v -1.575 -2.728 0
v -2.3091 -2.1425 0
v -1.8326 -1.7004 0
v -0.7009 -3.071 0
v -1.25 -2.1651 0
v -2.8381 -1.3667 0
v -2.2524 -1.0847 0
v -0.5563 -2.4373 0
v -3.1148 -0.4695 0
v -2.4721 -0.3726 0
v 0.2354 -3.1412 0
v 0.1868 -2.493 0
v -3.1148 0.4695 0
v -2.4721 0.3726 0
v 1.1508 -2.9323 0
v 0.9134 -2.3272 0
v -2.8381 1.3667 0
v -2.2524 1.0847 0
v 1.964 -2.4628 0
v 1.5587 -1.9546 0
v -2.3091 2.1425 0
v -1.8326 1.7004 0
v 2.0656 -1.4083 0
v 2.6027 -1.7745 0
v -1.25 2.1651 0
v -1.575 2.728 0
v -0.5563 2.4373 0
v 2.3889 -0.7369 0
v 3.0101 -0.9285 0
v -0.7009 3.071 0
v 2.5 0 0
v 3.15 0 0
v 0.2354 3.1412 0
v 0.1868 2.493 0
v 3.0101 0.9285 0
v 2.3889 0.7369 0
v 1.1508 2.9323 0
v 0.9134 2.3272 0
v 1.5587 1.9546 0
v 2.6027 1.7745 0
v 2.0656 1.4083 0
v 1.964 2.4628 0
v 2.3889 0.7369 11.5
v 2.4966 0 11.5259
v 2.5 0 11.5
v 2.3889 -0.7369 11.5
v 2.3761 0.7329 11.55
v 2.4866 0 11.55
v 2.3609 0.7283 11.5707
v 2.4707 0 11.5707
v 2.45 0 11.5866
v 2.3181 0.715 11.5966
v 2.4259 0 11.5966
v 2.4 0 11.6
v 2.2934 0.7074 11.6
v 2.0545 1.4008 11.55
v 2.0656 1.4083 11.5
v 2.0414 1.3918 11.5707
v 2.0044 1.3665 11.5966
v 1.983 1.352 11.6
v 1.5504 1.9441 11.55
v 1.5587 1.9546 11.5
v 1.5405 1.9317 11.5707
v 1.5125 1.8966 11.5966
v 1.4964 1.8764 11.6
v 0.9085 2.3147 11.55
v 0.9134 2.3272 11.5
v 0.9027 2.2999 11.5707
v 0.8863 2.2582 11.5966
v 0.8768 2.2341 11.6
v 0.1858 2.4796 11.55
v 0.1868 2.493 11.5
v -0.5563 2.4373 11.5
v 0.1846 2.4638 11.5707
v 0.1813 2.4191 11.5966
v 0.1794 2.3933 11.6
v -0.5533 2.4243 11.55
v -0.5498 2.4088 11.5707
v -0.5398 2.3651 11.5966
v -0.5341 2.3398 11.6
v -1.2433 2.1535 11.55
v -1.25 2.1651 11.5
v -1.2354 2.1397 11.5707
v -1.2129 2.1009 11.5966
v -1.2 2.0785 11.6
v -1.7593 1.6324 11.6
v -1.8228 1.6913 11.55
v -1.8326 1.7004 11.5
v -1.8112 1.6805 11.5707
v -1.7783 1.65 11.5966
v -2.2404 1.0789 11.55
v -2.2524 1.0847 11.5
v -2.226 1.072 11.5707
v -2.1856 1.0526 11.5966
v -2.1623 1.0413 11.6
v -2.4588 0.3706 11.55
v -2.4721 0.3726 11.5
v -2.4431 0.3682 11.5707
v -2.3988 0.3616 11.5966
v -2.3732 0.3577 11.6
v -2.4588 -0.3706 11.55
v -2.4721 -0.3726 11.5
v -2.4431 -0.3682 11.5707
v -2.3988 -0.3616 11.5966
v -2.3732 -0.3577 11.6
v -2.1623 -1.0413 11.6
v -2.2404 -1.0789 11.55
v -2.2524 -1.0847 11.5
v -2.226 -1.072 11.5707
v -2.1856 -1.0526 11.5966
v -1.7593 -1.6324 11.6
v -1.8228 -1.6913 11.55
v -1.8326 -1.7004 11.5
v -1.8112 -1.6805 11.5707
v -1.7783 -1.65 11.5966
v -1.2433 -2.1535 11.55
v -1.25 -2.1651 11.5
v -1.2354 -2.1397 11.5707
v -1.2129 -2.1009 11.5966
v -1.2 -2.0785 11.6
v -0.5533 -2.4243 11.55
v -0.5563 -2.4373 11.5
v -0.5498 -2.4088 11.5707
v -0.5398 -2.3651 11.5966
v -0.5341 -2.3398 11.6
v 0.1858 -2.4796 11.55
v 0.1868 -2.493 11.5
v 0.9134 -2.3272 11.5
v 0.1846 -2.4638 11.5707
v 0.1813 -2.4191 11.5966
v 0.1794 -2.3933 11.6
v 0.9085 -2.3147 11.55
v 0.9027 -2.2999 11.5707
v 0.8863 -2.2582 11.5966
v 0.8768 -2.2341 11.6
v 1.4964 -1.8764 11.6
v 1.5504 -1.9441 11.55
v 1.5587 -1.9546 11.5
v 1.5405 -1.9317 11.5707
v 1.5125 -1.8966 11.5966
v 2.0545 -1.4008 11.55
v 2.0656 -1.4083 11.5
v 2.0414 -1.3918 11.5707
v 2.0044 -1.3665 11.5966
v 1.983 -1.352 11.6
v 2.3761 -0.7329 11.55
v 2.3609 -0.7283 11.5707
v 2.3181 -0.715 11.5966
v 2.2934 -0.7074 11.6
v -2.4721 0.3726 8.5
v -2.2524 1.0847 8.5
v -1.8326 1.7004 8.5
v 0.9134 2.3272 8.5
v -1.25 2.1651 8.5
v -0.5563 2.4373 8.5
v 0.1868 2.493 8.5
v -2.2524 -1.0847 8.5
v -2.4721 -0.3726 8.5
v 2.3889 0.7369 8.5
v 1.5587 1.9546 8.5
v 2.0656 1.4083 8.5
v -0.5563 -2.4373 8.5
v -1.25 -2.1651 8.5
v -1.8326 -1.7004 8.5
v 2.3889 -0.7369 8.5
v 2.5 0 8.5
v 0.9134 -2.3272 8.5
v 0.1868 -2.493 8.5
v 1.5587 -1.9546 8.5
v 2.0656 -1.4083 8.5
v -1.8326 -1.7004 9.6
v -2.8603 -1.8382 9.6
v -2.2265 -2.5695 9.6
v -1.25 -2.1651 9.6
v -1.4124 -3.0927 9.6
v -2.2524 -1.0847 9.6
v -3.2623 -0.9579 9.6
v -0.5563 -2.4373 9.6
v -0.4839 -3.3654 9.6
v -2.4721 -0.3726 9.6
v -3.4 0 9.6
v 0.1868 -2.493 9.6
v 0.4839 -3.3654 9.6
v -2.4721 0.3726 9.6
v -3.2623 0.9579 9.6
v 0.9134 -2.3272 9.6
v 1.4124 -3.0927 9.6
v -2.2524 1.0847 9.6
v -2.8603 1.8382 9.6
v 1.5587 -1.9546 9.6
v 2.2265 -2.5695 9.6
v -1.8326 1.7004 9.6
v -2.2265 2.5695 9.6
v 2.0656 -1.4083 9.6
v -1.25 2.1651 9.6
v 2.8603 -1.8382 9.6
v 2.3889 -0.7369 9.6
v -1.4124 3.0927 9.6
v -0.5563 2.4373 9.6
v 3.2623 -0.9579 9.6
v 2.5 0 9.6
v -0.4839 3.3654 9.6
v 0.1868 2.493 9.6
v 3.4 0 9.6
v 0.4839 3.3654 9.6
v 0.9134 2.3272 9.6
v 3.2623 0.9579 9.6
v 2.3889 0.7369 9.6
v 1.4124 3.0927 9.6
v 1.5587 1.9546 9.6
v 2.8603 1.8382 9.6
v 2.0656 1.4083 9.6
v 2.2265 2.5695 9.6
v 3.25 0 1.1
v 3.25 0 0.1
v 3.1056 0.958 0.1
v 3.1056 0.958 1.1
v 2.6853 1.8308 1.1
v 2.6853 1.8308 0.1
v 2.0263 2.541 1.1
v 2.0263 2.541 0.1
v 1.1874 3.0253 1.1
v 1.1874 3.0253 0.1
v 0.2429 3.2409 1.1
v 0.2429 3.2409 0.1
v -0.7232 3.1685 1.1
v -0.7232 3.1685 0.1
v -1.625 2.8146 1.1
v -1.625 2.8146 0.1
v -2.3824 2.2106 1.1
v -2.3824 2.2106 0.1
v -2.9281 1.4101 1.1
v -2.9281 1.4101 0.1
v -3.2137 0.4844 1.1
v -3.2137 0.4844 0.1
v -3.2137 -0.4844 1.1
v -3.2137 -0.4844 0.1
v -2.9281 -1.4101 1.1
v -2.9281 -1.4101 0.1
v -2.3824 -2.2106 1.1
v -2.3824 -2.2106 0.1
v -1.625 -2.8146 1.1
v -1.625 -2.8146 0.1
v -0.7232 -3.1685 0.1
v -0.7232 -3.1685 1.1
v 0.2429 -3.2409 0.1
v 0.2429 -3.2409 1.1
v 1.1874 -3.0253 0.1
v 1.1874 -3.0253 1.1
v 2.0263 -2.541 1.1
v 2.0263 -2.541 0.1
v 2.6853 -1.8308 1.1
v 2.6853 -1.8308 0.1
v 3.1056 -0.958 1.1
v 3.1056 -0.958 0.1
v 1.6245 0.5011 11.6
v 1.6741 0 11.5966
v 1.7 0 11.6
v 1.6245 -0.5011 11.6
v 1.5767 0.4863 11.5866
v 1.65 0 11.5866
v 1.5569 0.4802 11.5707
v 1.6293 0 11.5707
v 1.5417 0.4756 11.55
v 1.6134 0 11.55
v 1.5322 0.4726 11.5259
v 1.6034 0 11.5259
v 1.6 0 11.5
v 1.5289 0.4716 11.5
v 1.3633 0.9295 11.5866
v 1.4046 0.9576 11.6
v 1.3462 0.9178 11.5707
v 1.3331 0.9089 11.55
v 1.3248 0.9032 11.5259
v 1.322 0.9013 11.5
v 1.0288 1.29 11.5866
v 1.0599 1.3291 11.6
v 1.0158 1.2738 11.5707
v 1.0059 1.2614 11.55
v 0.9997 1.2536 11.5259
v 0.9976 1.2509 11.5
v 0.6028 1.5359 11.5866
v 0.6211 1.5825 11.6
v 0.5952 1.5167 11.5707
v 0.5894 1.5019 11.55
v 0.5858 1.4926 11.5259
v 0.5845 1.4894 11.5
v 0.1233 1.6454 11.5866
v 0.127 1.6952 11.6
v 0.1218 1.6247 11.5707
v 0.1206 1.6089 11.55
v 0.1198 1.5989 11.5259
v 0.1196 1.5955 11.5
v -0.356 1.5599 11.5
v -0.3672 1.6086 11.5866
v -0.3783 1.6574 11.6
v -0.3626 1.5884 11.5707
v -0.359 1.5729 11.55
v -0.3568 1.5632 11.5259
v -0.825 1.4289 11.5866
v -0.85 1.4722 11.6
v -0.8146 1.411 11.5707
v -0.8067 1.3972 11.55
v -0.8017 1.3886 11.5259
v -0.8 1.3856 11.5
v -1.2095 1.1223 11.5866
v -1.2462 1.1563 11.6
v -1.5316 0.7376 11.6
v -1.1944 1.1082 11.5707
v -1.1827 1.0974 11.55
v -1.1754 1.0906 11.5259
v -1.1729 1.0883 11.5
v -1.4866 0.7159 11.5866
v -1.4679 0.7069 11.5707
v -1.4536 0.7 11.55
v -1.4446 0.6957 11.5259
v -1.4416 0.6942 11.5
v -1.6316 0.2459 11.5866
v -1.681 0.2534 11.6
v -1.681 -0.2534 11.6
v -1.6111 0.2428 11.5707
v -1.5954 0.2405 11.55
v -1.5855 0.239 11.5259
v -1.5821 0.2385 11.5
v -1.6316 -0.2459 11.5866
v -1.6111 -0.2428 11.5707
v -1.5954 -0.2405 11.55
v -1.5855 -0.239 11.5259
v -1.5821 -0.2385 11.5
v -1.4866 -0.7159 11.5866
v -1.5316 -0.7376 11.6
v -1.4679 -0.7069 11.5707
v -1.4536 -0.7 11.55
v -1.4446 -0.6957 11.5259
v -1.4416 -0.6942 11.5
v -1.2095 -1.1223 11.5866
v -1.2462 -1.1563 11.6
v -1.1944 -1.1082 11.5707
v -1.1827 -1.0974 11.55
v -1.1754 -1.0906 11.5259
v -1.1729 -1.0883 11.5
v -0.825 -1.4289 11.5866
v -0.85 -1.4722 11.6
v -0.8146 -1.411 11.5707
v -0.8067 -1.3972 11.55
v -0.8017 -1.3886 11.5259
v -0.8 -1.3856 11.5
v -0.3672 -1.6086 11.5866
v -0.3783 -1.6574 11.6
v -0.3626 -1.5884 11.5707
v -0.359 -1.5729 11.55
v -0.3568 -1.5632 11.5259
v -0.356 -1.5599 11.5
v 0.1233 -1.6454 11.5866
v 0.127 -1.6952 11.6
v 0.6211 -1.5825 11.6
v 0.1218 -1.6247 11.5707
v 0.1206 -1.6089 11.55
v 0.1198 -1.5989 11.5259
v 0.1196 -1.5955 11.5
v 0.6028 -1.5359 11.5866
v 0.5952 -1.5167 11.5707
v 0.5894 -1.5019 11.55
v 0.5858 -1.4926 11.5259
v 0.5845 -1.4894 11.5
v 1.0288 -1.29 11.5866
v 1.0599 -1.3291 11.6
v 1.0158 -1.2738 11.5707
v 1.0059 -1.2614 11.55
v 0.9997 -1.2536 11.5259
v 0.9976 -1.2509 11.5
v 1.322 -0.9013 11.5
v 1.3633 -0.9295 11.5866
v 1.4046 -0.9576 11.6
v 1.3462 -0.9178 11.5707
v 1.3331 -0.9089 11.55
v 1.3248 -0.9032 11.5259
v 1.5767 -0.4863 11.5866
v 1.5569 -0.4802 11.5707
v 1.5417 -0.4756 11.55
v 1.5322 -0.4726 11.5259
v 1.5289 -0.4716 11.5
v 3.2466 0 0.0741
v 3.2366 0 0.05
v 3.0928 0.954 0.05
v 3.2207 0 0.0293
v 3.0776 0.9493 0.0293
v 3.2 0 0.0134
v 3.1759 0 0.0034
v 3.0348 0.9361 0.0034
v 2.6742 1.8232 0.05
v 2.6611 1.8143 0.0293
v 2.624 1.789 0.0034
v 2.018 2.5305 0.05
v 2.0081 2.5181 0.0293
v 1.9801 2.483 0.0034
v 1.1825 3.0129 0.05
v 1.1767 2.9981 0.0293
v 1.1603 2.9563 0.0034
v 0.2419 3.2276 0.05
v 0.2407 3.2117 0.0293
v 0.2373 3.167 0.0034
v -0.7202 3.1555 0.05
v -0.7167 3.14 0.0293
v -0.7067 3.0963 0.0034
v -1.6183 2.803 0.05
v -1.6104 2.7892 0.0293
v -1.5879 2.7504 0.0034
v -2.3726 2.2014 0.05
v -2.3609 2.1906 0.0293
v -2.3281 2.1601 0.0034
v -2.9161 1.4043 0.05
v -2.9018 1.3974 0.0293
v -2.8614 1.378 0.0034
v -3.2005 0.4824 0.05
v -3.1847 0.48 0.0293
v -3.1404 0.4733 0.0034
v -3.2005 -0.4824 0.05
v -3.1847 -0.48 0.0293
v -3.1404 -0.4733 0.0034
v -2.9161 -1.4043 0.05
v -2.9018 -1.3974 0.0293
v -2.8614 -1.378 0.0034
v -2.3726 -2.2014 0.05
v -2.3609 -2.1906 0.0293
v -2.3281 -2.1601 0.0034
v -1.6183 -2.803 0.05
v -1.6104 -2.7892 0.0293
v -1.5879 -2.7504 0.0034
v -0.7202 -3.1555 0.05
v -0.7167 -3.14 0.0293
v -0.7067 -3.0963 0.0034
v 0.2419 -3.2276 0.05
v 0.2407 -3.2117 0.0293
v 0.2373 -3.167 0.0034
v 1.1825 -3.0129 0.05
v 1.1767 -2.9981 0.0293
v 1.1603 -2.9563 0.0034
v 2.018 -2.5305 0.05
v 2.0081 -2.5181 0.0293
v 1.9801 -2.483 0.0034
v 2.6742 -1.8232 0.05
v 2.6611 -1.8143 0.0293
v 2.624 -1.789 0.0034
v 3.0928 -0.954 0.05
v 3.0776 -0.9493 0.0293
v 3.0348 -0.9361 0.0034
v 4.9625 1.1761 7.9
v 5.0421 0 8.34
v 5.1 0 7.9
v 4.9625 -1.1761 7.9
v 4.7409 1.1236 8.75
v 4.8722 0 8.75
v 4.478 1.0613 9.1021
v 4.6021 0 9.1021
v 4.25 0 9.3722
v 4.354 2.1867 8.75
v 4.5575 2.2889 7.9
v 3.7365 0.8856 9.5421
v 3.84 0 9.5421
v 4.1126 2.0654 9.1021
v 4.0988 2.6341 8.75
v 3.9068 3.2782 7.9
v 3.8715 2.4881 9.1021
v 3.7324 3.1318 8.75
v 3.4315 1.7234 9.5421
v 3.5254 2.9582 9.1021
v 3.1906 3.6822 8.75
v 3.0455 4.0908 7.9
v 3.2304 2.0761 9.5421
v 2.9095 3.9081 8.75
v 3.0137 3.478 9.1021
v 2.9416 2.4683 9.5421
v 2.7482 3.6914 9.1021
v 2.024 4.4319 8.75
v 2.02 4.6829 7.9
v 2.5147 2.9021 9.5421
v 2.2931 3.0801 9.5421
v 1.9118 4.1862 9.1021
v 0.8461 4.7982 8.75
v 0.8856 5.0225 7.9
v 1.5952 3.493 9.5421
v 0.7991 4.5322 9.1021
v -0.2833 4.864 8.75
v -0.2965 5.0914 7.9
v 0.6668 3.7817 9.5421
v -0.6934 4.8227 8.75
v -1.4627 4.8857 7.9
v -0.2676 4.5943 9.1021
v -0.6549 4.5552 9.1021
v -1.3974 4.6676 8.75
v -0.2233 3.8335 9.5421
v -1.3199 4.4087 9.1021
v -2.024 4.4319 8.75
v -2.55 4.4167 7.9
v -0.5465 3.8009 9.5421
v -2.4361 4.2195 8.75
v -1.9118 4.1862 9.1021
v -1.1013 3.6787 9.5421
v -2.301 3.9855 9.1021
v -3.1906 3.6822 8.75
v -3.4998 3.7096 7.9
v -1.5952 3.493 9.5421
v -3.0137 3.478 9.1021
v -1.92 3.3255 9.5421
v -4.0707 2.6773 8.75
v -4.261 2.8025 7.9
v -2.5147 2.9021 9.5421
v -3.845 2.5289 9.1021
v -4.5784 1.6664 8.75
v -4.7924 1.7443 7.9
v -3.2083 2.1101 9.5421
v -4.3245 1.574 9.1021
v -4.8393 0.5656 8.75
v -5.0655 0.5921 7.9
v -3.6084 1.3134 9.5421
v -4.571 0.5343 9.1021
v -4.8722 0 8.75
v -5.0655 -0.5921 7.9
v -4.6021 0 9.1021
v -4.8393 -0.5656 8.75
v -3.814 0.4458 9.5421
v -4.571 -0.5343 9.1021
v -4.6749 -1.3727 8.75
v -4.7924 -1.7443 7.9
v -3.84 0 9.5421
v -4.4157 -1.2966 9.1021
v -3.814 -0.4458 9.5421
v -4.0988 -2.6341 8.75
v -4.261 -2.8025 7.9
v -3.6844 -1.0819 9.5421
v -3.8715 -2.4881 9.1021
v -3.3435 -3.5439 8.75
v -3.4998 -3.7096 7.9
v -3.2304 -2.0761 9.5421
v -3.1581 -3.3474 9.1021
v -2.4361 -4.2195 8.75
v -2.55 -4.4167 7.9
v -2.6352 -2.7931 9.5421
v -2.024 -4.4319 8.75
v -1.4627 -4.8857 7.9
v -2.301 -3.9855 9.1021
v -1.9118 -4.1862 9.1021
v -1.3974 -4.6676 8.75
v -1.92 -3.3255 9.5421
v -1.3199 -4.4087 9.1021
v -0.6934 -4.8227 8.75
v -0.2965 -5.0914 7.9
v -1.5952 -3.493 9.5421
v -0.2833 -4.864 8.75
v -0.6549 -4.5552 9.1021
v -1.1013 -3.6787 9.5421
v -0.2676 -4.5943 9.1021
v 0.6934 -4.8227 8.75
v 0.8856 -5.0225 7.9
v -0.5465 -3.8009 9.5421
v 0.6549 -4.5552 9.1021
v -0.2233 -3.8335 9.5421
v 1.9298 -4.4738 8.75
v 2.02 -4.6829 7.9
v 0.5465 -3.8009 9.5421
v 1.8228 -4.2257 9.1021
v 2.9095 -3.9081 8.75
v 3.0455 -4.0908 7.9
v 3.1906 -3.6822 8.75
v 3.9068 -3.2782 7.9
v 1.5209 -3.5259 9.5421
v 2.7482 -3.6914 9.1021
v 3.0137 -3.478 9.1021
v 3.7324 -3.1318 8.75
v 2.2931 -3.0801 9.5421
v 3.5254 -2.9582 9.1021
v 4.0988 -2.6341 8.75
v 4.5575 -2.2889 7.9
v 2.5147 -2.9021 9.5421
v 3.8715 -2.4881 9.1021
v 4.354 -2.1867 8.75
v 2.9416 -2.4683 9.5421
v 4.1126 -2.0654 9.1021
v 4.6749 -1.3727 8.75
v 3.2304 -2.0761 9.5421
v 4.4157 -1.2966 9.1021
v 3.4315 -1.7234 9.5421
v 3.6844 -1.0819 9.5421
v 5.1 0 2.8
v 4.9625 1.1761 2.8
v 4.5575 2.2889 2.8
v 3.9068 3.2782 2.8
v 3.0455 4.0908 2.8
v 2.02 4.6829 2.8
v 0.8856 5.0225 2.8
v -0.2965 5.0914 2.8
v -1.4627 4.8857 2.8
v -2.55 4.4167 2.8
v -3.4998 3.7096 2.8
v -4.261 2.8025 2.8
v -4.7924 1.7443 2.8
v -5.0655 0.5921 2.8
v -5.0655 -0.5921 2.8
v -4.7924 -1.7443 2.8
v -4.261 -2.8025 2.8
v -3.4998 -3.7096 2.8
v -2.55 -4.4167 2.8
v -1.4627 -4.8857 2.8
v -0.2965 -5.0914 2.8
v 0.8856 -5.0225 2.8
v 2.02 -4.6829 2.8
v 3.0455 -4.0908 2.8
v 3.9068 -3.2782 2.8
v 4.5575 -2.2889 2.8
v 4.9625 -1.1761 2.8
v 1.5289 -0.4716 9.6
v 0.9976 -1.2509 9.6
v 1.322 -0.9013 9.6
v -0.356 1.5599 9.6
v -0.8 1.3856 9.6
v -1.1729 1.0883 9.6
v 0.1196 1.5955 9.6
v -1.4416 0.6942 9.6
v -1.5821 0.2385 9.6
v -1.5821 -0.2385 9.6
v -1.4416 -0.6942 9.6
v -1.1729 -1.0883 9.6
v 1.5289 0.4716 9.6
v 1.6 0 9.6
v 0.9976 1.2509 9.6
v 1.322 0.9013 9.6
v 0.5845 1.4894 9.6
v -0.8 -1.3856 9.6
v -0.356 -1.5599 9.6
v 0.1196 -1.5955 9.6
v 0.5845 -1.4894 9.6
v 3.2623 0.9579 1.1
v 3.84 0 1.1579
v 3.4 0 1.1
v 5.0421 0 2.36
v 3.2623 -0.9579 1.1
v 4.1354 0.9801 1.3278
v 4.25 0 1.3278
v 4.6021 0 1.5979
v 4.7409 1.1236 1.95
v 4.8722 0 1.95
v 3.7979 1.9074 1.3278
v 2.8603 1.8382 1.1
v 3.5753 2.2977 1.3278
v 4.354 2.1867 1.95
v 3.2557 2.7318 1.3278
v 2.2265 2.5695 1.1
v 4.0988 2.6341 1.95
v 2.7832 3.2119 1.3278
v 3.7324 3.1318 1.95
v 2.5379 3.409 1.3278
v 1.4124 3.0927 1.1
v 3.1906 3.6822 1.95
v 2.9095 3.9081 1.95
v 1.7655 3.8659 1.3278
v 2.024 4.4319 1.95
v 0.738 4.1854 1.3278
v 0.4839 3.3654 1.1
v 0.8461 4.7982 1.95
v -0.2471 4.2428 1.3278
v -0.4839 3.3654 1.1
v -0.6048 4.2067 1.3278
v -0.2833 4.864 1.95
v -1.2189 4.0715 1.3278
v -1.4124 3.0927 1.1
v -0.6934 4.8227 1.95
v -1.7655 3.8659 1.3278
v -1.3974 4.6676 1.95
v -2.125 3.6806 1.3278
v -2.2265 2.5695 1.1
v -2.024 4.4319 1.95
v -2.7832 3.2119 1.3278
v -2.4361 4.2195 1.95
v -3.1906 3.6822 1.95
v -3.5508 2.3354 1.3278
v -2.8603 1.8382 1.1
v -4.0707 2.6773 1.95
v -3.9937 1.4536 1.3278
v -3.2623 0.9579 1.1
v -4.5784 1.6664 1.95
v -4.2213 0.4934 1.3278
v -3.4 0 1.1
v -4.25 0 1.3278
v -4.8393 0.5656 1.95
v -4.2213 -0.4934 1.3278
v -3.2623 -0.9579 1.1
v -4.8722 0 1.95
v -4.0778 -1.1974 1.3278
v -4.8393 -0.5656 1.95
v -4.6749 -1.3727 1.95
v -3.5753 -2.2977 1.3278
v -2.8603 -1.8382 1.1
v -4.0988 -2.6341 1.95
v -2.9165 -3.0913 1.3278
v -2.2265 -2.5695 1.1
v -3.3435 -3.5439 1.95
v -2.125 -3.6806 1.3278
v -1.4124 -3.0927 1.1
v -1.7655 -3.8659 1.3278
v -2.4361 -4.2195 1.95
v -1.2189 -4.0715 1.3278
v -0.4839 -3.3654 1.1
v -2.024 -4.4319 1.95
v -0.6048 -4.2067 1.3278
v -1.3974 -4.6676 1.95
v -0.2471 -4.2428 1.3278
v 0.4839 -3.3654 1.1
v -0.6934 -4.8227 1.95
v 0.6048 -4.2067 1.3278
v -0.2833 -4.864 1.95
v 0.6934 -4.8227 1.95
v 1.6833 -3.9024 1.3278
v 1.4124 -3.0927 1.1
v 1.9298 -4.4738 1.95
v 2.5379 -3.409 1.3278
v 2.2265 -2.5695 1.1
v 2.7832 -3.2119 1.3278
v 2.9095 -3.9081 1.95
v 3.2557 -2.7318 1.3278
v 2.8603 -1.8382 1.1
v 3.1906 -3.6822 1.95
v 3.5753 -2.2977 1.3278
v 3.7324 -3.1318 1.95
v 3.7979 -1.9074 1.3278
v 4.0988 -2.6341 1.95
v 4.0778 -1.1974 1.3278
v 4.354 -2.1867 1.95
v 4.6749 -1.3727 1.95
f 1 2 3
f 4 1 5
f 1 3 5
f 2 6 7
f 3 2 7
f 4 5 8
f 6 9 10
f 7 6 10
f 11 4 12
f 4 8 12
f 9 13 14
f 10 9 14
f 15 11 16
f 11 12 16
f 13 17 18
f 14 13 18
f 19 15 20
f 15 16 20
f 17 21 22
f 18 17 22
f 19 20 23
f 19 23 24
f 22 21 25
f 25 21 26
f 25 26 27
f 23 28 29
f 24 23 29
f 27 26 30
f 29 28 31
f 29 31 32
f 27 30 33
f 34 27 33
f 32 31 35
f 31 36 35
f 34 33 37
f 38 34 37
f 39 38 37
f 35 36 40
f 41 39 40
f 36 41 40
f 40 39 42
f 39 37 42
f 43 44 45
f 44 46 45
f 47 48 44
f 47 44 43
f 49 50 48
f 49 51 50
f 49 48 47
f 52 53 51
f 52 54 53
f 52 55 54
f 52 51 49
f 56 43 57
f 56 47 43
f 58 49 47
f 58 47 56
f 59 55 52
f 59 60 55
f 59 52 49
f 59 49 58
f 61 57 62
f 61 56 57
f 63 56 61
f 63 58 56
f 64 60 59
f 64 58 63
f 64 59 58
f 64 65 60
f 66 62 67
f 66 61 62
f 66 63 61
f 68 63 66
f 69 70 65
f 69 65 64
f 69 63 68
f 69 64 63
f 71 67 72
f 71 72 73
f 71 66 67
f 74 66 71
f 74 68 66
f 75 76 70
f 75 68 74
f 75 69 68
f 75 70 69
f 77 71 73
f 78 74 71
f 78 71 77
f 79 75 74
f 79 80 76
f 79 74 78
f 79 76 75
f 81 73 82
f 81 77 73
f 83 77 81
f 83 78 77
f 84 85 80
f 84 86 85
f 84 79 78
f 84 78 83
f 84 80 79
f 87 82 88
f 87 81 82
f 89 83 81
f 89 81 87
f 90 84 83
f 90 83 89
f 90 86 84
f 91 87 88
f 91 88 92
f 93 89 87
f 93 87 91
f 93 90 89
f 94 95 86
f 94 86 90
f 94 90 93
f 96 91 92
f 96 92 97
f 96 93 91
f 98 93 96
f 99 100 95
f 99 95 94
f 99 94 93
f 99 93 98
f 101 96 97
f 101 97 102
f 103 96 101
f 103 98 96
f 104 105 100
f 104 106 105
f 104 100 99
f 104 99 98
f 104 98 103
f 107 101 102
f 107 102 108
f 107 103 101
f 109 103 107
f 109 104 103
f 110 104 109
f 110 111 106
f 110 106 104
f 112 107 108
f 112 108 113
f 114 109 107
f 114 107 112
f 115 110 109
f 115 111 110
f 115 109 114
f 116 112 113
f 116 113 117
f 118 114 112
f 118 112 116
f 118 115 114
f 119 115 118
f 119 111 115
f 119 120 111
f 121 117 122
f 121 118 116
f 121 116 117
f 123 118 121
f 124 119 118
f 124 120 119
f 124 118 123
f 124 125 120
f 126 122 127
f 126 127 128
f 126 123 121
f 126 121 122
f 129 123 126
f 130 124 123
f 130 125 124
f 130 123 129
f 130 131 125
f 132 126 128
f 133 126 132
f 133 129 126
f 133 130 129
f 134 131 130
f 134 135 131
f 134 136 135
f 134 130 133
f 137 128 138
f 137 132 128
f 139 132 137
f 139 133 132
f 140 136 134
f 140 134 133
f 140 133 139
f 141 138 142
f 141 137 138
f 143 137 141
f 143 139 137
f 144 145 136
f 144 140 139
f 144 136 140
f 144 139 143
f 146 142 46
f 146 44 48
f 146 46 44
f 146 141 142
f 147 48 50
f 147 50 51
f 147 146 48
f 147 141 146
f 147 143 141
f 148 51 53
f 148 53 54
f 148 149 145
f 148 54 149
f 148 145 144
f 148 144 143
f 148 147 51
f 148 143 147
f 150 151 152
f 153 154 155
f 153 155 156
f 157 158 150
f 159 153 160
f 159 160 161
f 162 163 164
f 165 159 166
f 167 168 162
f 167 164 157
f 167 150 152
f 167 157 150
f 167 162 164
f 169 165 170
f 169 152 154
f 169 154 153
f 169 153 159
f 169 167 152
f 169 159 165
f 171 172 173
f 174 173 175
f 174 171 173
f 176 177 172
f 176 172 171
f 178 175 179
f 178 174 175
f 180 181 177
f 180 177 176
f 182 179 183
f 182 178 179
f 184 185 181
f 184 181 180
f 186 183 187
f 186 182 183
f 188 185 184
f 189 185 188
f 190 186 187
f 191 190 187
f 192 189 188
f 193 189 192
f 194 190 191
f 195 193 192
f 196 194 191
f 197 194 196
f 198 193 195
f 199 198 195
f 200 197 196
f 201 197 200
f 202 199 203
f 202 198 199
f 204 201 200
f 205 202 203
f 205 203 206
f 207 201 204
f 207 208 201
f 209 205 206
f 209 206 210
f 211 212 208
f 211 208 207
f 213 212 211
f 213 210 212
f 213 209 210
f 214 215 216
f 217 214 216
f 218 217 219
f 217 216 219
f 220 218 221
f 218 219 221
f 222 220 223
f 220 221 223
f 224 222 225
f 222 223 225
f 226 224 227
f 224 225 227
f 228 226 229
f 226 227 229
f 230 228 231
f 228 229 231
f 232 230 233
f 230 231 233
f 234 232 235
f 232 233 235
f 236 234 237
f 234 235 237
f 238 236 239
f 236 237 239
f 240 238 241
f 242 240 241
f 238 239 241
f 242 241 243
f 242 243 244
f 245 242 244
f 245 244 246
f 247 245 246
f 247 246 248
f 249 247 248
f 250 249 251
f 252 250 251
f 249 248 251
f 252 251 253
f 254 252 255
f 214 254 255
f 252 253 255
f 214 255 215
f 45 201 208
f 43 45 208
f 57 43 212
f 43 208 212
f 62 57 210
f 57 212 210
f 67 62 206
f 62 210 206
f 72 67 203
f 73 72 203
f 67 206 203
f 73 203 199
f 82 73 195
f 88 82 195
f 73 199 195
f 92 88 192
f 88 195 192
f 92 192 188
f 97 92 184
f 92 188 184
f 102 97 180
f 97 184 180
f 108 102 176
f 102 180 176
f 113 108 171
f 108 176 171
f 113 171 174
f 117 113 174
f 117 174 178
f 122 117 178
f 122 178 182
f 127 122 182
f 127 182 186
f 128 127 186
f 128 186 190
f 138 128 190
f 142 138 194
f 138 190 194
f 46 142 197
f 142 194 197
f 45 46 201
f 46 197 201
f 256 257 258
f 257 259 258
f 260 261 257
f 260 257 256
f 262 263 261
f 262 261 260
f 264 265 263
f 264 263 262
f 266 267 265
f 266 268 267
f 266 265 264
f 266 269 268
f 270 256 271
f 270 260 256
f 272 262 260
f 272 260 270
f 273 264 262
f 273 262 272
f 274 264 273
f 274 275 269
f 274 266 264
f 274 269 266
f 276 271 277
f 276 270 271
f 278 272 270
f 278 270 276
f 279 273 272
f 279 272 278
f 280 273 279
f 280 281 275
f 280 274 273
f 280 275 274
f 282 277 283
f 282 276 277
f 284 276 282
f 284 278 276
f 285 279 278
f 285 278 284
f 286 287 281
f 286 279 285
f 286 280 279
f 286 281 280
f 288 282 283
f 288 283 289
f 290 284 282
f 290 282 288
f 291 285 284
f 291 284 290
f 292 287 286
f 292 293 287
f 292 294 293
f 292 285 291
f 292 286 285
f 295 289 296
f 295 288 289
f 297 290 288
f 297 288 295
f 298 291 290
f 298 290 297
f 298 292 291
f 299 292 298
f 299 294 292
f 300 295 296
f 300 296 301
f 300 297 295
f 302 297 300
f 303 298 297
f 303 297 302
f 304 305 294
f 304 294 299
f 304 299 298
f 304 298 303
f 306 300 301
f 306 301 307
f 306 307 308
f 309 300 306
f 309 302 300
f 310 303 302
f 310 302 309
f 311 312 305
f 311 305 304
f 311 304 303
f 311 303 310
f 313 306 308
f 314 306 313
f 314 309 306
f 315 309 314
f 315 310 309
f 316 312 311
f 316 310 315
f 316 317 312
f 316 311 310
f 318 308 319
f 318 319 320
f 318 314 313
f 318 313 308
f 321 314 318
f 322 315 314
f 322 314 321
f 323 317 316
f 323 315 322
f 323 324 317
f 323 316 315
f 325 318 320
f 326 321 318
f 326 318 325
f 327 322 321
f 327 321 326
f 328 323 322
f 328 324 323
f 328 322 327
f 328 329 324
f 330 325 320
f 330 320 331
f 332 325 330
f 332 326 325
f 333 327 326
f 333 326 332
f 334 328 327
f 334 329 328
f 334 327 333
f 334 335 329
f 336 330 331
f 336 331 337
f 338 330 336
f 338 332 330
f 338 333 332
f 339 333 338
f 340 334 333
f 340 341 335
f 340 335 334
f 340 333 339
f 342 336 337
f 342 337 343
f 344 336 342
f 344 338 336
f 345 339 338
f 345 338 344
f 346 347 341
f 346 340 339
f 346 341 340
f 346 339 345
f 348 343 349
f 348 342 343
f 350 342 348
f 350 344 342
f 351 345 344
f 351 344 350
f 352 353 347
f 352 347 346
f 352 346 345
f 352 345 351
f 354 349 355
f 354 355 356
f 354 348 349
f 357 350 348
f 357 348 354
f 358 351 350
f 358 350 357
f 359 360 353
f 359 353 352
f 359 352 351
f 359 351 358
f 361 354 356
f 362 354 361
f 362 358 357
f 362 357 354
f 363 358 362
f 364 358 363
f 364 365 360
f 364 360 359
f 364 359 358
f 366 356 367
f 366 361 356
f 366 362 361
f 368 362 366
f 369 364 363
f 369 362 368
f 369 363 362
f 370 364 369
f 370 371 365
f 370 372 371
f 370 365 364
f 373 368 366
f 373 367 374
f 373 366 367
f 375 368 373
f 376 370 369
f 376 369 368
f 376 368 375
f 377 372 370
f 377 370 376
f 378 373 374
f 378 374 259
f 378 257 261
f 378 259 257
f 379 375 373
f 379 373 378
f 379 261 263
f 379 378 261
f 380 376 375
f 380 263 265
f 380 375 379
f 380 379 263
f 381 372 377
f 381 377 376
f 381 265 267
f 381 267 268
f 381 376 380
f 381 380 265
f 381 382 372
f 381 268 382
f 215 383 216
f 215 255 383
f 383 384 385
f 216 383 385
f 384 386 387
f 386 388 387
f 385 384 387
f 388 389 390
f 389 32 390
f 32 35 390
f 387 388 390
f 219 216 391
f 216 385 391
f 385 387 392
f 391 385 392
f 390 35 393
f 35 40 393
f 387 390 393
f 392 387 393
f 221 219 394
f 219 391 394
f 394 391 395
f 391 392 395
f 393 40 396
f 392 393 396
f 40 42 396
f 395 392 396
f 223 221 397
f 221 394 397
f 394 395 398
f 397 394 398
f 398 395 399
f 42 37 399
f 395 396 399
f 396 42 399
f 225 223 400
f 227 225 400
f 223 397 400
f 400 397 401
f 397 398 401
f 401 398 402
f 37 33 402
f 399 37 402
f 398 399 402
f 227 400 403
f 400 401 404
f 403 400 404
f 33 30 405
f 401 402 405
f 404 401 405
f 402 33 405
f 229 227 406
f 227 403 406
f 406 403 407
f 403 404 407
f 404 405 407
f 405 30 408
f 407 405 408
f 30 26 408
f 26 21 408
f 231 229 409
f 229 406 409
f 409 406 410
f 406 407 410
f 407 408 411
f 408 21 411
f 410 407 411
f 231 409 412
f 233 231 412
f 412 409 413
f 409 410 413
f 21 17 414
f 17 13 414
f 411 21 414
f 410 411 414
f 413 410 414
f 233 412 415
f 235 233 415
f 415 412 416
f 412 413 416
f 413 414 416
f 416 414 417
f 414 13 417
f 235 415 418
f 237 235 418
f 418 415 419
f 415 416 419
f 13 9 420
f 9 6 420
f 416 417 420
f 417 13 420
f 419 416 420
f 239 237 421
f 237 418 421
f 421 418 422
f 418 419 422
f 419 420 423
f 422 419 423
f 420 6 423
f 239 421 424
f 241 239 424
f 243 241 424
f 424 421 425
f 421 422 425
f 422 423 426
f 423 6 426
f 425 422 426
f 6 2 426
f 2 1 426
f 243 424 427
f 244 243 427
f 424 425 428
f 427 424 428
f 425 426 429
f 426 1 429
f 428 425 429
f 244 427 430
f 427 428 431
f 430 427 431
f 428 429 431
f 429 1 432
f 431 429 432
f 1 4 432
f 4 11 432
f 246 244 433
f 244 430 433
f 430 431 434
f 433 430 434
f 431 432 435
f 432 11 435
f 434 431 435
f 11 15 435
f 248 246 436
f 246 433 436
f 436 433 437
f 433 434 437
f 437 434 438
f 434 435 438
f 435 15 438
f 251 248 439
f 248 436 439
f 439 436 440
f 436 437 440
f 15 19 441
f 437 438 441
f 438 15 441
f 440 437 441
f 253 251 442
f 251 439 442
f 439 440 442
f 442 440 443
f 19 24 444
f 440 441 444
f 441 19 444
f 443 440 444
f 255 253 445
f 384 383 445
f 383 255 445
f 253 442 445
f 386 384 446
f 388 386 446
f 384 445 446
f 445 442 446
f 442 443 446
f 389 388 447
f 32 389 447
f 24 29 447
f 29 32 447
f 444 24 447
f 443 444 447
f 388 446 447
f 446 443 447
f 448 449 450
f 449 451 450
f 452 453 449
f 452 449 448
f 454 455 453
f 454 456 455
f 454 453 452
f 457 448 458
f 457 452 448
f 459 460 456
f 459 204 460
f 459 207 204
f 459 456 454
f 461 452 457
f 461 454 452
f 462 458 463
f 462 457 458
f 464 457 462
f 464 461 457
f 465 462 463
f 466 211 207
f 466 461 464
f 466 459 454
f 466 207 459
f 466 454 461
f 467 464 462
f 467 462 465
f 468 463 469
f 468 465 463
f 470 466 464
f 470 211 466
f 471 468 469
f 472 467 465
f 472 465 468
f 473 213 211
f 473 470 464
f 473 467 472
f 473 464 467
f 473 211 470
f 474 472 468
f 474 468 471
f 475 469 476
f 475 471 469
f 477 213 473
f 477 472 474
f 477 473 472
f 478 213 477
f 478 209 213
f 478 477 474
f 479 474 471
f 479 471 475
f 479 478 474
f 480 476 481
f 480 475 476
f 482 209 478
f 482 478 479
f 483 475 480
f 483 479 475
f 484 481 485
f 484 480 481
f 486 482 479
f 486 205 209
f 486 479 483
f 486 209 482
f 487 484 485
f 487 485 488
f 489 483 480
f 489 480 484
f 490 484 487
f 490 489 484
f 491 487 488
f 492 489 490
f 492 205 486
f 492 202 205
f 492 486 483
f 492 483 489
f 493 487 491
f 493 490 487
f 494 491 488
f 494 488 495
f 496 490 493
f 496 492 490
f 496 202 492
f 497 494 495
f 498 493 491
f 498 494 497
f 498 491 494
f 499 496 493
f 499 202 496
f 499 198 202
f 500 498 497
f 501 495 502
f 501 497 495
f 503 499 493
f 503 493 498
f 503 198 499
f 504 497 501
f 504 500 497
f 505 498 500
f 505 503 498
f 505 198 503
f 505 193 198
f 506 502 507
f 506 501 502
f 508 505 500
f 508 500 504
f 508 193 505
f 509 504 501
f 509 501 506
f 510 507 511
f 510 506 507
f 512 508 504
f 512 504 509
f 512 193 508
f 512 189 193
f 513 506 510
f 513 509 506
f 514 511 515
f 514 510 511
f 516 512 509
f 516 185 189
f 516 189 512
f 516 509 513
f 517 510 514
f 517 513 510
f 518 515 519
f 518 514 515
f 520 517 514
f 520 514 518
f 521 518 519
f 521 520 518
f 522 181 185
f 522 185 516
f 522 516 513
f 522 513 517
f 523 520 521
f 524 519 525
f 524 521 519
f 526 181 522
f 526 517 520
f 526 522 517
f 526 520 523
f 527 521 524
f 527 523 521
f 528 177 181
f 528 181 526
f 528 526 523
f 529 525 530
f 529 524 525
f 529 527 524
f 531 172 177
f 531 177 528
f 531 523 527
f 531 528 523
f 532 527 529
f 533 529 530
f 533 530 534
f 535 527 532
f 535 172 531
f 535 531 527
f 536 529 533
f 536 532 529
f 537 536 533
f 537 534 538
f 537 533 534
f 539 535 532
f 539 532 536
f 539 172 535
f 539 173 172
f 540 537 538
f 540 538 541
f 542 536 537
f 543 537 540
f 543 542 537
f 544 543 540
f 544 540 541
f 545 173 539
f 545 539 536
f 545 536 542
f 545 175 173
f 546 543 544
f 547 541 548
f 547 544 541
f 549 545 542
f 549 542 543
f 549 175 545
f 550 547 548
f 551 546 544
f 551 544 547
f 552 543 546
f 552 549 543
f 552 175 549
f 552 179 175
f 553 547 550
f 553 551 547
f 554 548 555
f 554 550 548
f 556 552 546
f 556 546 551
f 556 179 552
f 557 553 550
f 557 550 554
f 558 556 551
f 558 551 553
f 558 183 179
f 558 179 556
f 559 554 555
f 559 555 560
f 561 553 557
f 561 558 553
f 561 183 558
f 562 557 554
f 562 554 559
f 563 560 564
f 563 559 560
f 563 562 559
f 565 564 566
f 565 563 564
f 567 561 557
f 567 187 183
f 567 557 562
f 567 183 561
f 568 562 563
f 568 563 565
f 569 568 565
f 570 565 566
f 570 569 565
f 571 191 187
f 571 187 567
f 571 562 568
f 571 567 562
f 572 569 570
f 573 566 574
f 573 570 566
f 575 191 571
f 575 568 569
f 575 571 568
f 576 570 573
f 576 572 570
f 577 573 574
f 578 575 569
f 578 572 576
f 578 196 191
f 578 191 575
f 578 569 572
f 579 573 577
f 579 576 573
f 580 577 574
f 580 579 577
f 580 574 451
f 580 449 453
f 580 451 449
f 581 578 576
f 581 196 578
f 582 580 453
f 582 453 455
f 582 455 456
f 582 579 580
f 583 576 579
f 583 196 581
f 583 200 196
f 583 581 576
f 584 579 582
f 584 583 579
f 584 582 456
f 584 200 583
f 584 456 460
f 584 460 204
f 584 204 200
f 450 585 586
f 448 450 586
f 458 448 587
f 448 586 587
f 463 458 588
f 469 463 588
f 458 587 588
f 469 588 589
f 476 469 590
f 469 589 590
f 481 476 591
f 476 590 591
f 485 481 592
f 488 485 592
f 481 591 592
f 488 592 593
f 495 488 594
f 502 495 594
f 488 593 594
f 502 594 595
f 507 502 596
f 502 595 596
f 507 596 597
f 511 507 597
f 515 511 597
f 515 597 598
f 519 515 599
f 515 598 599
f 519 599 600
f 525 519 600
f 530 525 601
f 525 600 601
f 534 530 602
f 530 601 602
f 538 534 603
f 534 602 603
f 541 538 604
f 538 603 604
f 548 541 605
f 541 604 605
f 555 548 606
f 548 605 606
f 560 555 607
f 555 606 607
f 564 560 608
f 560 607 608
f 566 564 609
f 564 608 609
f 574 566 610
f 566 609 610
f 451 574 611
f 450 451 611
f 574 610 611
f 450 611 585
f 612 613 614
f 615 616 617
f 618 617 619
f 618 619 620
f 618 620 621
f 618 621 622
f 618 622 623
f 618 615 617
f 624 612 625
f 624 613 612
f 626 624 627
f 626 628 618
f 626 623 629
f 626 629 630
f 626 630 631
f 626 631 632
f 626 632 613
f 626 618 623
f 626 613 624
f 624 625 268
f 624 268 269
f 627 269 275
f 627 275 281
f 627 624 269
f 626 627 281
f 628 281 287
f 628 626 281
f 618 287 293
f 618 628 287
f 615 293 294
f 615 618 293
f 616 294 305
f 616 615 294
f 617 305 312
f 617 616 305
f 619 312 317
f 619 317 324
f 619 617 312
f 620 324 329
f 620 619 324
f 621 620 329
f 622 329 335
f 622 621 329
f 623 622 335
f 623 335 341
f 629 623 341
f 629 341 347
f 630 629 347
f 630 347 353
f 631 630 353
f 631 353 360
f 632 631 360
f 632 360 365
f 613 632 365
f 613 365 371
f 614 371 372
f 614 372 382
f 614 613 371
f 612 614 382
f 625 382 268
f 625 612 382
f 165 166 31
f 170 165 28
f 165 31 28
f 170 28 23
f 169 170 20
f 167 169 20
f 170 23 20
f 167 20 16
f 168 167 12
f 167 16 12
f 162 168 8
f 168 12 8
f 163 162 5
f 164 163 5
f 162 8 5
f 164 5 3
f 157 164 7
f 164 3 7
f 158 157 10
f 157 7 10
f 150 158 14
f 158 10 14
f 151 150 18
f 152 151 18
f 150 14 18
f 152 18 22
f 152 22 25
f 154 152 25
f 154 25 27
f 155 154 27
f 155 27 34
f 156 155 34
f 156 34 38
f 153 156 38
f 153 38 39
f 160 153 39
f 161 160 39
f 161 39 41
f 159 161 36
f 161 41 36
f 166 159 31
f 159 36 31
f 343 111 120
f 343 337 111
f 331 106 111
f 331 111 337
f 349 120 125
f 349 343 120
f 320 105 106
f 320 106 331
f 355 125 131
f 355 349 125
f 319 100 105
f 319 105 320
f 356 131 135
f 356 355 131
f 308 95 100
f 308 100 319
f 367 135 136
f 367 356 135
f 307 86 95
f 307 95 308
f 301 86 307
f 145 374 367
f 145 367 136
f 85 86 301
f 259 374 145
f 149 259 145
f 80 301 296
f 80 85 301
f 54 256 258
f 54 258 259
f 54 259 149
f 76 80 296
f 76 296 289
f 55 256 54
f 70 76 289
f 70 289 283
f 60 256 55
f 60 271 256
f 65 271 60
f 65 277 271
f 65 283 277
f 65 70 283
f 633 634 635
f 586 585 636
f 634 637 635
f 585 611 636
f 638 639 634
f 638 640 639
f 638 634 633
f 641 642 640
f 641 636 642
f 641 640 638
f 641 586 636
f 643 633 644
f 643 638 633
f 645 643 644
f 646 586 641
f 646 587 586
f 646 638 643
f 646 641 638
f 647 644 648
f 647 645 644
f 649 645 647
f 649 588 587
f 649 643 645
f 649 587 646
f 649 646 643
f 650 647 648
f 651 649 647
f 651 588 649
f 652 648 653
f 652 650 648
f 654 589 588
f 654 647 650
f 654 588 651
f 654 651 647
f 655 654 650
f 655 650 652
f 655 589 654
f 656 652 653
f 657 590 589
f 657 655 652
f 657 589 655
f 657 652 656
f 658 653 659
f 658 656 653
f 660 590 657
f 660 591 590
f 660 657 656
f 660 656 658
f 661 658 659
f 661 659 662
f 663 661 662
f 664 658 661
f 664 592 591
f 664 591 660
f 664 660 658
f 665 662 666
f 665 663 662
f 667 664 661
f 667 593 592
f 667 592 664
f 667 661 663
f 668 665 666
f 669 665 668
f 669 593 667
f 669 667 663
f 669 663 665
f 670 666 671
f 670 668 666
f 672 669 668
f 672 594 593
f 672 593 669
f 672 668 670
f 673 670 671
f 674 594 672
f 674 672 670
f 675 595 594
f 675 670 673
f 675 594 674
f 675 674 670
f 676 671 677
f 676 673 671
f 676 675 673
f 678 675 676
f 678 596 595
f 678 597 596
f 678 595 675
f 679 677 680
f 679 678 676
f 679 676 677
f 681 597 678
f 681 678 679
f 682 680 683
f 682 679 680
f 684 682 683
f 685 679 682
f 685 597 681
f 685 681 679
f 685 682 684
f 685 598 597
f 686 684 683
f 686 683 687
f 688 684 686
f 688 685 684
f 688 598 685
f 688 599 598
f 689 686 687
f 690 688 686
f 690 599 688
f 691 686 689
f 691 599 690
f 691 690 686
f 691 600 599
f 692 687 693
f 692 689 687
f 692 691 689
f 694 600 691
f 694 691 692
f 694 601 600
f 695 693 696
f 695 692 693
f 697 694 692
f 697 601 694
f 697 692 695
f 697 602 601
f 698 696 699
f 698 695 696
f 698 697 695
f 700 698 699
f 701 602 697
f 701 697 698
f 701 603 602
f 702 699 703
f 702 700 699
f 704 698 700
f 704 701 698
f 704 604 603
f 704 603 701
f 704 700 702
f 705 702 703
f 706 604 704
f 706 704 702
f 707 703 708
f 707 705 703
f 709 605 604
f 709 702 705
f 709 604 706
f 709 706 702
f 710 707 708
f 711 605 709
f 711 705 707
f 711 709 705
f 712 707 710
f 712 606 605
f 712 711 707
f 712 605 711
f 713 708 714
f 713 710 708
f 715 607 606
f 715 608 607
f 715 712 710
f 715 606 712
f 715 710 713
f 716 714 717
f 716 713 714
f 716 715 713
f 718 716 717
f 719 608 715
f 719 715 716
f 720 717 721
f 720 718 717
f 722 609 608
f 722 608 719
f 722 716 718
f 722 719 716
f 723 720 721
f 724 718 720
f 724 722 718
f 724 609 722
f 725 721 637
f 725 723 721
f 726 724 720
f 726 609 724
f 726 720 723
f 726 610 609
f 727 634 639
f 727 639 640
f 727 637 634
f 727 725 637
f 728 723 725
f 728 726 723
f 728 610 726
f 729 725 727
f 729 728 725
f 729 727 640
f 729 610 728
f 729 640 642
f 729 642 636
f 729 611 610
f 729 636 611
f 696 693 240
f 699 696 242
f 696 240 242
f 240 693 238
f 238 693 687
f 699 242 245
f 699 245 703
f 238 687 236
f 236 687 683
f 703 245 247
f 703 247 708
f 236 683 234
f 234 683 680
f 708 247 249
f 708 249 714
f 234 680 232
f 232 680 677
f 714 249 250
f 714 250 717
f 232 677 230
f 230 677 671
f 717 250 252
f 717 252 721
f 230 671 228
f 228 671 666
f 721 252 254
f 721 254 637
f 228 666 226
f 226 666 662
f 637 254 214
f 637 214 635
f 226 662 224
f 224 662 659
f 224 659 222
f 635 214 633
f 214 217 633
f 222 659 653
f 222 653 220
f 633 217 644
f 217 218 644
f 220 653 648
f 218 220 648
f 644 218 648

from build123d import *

# Parameters (mm, degrees)
F0_R     = 3.25
F1_DEPTH = 1.1
F2_R     = 5.1
F3_DEPTH = 8.5
F4_R     = 2.5
F4_R_2   = 1.6
F5_DEPTH = 2
F6_R     = 2.5
F7_DEPTH = 8.5
F8_R     = 0.1
F9_R     = 1.7


with BuildPart() as f1:
    # F0 (on Top) → F1 (new body)
    with BuildSketch(Plane.XY):
        Circle(F0_R)
    extrude(amount=F1_DEPTH)

    # F2 (on face) → F3 (join)
    with BuildSketch(Plane.XY.offset(1.1)):
        Circle(F2_R)
    extrude(amount=F3_DEPTH)

    # F4 (on face) → F5 (join)
    with BuildSketch(Plane.XY.offset(9.6)):
        Circle(F4_R)
        Circle(F4_R_2, mode=Mode.SUBTRACT)
    extrude(amount=F5_DEPTH)

    # F6 (on face) → F7 (cut)
    with BuildSketch(Plane(origin=(0, 0, 0), x_dir=(1, 0, 0), z_dir=(0, 0, -1))):
        Circle(F6_R)
    extrude(amount=-F7_DEPTH, mode=Mode.SUBTRACT)

    # F8
    f8_edges = [f1.edges().sort_by_distance(p)[0] for p in [
        (-3.25, 0, 0),
        (-2.5, 0, 11.6),
        (-1.6, 0, 11.6),
    ]]
    fillet(f8_edges, radius=F8_R)

    # F9
    f9_edges = [f1.edges().sort_by_distance(p)[0] for p in [
        (-5.1, 0, 9.6),
        (-5.1, 0, 1.1),
    ]]
    fillet(f9_edges, radius=F9_R)


solid = f1.part
